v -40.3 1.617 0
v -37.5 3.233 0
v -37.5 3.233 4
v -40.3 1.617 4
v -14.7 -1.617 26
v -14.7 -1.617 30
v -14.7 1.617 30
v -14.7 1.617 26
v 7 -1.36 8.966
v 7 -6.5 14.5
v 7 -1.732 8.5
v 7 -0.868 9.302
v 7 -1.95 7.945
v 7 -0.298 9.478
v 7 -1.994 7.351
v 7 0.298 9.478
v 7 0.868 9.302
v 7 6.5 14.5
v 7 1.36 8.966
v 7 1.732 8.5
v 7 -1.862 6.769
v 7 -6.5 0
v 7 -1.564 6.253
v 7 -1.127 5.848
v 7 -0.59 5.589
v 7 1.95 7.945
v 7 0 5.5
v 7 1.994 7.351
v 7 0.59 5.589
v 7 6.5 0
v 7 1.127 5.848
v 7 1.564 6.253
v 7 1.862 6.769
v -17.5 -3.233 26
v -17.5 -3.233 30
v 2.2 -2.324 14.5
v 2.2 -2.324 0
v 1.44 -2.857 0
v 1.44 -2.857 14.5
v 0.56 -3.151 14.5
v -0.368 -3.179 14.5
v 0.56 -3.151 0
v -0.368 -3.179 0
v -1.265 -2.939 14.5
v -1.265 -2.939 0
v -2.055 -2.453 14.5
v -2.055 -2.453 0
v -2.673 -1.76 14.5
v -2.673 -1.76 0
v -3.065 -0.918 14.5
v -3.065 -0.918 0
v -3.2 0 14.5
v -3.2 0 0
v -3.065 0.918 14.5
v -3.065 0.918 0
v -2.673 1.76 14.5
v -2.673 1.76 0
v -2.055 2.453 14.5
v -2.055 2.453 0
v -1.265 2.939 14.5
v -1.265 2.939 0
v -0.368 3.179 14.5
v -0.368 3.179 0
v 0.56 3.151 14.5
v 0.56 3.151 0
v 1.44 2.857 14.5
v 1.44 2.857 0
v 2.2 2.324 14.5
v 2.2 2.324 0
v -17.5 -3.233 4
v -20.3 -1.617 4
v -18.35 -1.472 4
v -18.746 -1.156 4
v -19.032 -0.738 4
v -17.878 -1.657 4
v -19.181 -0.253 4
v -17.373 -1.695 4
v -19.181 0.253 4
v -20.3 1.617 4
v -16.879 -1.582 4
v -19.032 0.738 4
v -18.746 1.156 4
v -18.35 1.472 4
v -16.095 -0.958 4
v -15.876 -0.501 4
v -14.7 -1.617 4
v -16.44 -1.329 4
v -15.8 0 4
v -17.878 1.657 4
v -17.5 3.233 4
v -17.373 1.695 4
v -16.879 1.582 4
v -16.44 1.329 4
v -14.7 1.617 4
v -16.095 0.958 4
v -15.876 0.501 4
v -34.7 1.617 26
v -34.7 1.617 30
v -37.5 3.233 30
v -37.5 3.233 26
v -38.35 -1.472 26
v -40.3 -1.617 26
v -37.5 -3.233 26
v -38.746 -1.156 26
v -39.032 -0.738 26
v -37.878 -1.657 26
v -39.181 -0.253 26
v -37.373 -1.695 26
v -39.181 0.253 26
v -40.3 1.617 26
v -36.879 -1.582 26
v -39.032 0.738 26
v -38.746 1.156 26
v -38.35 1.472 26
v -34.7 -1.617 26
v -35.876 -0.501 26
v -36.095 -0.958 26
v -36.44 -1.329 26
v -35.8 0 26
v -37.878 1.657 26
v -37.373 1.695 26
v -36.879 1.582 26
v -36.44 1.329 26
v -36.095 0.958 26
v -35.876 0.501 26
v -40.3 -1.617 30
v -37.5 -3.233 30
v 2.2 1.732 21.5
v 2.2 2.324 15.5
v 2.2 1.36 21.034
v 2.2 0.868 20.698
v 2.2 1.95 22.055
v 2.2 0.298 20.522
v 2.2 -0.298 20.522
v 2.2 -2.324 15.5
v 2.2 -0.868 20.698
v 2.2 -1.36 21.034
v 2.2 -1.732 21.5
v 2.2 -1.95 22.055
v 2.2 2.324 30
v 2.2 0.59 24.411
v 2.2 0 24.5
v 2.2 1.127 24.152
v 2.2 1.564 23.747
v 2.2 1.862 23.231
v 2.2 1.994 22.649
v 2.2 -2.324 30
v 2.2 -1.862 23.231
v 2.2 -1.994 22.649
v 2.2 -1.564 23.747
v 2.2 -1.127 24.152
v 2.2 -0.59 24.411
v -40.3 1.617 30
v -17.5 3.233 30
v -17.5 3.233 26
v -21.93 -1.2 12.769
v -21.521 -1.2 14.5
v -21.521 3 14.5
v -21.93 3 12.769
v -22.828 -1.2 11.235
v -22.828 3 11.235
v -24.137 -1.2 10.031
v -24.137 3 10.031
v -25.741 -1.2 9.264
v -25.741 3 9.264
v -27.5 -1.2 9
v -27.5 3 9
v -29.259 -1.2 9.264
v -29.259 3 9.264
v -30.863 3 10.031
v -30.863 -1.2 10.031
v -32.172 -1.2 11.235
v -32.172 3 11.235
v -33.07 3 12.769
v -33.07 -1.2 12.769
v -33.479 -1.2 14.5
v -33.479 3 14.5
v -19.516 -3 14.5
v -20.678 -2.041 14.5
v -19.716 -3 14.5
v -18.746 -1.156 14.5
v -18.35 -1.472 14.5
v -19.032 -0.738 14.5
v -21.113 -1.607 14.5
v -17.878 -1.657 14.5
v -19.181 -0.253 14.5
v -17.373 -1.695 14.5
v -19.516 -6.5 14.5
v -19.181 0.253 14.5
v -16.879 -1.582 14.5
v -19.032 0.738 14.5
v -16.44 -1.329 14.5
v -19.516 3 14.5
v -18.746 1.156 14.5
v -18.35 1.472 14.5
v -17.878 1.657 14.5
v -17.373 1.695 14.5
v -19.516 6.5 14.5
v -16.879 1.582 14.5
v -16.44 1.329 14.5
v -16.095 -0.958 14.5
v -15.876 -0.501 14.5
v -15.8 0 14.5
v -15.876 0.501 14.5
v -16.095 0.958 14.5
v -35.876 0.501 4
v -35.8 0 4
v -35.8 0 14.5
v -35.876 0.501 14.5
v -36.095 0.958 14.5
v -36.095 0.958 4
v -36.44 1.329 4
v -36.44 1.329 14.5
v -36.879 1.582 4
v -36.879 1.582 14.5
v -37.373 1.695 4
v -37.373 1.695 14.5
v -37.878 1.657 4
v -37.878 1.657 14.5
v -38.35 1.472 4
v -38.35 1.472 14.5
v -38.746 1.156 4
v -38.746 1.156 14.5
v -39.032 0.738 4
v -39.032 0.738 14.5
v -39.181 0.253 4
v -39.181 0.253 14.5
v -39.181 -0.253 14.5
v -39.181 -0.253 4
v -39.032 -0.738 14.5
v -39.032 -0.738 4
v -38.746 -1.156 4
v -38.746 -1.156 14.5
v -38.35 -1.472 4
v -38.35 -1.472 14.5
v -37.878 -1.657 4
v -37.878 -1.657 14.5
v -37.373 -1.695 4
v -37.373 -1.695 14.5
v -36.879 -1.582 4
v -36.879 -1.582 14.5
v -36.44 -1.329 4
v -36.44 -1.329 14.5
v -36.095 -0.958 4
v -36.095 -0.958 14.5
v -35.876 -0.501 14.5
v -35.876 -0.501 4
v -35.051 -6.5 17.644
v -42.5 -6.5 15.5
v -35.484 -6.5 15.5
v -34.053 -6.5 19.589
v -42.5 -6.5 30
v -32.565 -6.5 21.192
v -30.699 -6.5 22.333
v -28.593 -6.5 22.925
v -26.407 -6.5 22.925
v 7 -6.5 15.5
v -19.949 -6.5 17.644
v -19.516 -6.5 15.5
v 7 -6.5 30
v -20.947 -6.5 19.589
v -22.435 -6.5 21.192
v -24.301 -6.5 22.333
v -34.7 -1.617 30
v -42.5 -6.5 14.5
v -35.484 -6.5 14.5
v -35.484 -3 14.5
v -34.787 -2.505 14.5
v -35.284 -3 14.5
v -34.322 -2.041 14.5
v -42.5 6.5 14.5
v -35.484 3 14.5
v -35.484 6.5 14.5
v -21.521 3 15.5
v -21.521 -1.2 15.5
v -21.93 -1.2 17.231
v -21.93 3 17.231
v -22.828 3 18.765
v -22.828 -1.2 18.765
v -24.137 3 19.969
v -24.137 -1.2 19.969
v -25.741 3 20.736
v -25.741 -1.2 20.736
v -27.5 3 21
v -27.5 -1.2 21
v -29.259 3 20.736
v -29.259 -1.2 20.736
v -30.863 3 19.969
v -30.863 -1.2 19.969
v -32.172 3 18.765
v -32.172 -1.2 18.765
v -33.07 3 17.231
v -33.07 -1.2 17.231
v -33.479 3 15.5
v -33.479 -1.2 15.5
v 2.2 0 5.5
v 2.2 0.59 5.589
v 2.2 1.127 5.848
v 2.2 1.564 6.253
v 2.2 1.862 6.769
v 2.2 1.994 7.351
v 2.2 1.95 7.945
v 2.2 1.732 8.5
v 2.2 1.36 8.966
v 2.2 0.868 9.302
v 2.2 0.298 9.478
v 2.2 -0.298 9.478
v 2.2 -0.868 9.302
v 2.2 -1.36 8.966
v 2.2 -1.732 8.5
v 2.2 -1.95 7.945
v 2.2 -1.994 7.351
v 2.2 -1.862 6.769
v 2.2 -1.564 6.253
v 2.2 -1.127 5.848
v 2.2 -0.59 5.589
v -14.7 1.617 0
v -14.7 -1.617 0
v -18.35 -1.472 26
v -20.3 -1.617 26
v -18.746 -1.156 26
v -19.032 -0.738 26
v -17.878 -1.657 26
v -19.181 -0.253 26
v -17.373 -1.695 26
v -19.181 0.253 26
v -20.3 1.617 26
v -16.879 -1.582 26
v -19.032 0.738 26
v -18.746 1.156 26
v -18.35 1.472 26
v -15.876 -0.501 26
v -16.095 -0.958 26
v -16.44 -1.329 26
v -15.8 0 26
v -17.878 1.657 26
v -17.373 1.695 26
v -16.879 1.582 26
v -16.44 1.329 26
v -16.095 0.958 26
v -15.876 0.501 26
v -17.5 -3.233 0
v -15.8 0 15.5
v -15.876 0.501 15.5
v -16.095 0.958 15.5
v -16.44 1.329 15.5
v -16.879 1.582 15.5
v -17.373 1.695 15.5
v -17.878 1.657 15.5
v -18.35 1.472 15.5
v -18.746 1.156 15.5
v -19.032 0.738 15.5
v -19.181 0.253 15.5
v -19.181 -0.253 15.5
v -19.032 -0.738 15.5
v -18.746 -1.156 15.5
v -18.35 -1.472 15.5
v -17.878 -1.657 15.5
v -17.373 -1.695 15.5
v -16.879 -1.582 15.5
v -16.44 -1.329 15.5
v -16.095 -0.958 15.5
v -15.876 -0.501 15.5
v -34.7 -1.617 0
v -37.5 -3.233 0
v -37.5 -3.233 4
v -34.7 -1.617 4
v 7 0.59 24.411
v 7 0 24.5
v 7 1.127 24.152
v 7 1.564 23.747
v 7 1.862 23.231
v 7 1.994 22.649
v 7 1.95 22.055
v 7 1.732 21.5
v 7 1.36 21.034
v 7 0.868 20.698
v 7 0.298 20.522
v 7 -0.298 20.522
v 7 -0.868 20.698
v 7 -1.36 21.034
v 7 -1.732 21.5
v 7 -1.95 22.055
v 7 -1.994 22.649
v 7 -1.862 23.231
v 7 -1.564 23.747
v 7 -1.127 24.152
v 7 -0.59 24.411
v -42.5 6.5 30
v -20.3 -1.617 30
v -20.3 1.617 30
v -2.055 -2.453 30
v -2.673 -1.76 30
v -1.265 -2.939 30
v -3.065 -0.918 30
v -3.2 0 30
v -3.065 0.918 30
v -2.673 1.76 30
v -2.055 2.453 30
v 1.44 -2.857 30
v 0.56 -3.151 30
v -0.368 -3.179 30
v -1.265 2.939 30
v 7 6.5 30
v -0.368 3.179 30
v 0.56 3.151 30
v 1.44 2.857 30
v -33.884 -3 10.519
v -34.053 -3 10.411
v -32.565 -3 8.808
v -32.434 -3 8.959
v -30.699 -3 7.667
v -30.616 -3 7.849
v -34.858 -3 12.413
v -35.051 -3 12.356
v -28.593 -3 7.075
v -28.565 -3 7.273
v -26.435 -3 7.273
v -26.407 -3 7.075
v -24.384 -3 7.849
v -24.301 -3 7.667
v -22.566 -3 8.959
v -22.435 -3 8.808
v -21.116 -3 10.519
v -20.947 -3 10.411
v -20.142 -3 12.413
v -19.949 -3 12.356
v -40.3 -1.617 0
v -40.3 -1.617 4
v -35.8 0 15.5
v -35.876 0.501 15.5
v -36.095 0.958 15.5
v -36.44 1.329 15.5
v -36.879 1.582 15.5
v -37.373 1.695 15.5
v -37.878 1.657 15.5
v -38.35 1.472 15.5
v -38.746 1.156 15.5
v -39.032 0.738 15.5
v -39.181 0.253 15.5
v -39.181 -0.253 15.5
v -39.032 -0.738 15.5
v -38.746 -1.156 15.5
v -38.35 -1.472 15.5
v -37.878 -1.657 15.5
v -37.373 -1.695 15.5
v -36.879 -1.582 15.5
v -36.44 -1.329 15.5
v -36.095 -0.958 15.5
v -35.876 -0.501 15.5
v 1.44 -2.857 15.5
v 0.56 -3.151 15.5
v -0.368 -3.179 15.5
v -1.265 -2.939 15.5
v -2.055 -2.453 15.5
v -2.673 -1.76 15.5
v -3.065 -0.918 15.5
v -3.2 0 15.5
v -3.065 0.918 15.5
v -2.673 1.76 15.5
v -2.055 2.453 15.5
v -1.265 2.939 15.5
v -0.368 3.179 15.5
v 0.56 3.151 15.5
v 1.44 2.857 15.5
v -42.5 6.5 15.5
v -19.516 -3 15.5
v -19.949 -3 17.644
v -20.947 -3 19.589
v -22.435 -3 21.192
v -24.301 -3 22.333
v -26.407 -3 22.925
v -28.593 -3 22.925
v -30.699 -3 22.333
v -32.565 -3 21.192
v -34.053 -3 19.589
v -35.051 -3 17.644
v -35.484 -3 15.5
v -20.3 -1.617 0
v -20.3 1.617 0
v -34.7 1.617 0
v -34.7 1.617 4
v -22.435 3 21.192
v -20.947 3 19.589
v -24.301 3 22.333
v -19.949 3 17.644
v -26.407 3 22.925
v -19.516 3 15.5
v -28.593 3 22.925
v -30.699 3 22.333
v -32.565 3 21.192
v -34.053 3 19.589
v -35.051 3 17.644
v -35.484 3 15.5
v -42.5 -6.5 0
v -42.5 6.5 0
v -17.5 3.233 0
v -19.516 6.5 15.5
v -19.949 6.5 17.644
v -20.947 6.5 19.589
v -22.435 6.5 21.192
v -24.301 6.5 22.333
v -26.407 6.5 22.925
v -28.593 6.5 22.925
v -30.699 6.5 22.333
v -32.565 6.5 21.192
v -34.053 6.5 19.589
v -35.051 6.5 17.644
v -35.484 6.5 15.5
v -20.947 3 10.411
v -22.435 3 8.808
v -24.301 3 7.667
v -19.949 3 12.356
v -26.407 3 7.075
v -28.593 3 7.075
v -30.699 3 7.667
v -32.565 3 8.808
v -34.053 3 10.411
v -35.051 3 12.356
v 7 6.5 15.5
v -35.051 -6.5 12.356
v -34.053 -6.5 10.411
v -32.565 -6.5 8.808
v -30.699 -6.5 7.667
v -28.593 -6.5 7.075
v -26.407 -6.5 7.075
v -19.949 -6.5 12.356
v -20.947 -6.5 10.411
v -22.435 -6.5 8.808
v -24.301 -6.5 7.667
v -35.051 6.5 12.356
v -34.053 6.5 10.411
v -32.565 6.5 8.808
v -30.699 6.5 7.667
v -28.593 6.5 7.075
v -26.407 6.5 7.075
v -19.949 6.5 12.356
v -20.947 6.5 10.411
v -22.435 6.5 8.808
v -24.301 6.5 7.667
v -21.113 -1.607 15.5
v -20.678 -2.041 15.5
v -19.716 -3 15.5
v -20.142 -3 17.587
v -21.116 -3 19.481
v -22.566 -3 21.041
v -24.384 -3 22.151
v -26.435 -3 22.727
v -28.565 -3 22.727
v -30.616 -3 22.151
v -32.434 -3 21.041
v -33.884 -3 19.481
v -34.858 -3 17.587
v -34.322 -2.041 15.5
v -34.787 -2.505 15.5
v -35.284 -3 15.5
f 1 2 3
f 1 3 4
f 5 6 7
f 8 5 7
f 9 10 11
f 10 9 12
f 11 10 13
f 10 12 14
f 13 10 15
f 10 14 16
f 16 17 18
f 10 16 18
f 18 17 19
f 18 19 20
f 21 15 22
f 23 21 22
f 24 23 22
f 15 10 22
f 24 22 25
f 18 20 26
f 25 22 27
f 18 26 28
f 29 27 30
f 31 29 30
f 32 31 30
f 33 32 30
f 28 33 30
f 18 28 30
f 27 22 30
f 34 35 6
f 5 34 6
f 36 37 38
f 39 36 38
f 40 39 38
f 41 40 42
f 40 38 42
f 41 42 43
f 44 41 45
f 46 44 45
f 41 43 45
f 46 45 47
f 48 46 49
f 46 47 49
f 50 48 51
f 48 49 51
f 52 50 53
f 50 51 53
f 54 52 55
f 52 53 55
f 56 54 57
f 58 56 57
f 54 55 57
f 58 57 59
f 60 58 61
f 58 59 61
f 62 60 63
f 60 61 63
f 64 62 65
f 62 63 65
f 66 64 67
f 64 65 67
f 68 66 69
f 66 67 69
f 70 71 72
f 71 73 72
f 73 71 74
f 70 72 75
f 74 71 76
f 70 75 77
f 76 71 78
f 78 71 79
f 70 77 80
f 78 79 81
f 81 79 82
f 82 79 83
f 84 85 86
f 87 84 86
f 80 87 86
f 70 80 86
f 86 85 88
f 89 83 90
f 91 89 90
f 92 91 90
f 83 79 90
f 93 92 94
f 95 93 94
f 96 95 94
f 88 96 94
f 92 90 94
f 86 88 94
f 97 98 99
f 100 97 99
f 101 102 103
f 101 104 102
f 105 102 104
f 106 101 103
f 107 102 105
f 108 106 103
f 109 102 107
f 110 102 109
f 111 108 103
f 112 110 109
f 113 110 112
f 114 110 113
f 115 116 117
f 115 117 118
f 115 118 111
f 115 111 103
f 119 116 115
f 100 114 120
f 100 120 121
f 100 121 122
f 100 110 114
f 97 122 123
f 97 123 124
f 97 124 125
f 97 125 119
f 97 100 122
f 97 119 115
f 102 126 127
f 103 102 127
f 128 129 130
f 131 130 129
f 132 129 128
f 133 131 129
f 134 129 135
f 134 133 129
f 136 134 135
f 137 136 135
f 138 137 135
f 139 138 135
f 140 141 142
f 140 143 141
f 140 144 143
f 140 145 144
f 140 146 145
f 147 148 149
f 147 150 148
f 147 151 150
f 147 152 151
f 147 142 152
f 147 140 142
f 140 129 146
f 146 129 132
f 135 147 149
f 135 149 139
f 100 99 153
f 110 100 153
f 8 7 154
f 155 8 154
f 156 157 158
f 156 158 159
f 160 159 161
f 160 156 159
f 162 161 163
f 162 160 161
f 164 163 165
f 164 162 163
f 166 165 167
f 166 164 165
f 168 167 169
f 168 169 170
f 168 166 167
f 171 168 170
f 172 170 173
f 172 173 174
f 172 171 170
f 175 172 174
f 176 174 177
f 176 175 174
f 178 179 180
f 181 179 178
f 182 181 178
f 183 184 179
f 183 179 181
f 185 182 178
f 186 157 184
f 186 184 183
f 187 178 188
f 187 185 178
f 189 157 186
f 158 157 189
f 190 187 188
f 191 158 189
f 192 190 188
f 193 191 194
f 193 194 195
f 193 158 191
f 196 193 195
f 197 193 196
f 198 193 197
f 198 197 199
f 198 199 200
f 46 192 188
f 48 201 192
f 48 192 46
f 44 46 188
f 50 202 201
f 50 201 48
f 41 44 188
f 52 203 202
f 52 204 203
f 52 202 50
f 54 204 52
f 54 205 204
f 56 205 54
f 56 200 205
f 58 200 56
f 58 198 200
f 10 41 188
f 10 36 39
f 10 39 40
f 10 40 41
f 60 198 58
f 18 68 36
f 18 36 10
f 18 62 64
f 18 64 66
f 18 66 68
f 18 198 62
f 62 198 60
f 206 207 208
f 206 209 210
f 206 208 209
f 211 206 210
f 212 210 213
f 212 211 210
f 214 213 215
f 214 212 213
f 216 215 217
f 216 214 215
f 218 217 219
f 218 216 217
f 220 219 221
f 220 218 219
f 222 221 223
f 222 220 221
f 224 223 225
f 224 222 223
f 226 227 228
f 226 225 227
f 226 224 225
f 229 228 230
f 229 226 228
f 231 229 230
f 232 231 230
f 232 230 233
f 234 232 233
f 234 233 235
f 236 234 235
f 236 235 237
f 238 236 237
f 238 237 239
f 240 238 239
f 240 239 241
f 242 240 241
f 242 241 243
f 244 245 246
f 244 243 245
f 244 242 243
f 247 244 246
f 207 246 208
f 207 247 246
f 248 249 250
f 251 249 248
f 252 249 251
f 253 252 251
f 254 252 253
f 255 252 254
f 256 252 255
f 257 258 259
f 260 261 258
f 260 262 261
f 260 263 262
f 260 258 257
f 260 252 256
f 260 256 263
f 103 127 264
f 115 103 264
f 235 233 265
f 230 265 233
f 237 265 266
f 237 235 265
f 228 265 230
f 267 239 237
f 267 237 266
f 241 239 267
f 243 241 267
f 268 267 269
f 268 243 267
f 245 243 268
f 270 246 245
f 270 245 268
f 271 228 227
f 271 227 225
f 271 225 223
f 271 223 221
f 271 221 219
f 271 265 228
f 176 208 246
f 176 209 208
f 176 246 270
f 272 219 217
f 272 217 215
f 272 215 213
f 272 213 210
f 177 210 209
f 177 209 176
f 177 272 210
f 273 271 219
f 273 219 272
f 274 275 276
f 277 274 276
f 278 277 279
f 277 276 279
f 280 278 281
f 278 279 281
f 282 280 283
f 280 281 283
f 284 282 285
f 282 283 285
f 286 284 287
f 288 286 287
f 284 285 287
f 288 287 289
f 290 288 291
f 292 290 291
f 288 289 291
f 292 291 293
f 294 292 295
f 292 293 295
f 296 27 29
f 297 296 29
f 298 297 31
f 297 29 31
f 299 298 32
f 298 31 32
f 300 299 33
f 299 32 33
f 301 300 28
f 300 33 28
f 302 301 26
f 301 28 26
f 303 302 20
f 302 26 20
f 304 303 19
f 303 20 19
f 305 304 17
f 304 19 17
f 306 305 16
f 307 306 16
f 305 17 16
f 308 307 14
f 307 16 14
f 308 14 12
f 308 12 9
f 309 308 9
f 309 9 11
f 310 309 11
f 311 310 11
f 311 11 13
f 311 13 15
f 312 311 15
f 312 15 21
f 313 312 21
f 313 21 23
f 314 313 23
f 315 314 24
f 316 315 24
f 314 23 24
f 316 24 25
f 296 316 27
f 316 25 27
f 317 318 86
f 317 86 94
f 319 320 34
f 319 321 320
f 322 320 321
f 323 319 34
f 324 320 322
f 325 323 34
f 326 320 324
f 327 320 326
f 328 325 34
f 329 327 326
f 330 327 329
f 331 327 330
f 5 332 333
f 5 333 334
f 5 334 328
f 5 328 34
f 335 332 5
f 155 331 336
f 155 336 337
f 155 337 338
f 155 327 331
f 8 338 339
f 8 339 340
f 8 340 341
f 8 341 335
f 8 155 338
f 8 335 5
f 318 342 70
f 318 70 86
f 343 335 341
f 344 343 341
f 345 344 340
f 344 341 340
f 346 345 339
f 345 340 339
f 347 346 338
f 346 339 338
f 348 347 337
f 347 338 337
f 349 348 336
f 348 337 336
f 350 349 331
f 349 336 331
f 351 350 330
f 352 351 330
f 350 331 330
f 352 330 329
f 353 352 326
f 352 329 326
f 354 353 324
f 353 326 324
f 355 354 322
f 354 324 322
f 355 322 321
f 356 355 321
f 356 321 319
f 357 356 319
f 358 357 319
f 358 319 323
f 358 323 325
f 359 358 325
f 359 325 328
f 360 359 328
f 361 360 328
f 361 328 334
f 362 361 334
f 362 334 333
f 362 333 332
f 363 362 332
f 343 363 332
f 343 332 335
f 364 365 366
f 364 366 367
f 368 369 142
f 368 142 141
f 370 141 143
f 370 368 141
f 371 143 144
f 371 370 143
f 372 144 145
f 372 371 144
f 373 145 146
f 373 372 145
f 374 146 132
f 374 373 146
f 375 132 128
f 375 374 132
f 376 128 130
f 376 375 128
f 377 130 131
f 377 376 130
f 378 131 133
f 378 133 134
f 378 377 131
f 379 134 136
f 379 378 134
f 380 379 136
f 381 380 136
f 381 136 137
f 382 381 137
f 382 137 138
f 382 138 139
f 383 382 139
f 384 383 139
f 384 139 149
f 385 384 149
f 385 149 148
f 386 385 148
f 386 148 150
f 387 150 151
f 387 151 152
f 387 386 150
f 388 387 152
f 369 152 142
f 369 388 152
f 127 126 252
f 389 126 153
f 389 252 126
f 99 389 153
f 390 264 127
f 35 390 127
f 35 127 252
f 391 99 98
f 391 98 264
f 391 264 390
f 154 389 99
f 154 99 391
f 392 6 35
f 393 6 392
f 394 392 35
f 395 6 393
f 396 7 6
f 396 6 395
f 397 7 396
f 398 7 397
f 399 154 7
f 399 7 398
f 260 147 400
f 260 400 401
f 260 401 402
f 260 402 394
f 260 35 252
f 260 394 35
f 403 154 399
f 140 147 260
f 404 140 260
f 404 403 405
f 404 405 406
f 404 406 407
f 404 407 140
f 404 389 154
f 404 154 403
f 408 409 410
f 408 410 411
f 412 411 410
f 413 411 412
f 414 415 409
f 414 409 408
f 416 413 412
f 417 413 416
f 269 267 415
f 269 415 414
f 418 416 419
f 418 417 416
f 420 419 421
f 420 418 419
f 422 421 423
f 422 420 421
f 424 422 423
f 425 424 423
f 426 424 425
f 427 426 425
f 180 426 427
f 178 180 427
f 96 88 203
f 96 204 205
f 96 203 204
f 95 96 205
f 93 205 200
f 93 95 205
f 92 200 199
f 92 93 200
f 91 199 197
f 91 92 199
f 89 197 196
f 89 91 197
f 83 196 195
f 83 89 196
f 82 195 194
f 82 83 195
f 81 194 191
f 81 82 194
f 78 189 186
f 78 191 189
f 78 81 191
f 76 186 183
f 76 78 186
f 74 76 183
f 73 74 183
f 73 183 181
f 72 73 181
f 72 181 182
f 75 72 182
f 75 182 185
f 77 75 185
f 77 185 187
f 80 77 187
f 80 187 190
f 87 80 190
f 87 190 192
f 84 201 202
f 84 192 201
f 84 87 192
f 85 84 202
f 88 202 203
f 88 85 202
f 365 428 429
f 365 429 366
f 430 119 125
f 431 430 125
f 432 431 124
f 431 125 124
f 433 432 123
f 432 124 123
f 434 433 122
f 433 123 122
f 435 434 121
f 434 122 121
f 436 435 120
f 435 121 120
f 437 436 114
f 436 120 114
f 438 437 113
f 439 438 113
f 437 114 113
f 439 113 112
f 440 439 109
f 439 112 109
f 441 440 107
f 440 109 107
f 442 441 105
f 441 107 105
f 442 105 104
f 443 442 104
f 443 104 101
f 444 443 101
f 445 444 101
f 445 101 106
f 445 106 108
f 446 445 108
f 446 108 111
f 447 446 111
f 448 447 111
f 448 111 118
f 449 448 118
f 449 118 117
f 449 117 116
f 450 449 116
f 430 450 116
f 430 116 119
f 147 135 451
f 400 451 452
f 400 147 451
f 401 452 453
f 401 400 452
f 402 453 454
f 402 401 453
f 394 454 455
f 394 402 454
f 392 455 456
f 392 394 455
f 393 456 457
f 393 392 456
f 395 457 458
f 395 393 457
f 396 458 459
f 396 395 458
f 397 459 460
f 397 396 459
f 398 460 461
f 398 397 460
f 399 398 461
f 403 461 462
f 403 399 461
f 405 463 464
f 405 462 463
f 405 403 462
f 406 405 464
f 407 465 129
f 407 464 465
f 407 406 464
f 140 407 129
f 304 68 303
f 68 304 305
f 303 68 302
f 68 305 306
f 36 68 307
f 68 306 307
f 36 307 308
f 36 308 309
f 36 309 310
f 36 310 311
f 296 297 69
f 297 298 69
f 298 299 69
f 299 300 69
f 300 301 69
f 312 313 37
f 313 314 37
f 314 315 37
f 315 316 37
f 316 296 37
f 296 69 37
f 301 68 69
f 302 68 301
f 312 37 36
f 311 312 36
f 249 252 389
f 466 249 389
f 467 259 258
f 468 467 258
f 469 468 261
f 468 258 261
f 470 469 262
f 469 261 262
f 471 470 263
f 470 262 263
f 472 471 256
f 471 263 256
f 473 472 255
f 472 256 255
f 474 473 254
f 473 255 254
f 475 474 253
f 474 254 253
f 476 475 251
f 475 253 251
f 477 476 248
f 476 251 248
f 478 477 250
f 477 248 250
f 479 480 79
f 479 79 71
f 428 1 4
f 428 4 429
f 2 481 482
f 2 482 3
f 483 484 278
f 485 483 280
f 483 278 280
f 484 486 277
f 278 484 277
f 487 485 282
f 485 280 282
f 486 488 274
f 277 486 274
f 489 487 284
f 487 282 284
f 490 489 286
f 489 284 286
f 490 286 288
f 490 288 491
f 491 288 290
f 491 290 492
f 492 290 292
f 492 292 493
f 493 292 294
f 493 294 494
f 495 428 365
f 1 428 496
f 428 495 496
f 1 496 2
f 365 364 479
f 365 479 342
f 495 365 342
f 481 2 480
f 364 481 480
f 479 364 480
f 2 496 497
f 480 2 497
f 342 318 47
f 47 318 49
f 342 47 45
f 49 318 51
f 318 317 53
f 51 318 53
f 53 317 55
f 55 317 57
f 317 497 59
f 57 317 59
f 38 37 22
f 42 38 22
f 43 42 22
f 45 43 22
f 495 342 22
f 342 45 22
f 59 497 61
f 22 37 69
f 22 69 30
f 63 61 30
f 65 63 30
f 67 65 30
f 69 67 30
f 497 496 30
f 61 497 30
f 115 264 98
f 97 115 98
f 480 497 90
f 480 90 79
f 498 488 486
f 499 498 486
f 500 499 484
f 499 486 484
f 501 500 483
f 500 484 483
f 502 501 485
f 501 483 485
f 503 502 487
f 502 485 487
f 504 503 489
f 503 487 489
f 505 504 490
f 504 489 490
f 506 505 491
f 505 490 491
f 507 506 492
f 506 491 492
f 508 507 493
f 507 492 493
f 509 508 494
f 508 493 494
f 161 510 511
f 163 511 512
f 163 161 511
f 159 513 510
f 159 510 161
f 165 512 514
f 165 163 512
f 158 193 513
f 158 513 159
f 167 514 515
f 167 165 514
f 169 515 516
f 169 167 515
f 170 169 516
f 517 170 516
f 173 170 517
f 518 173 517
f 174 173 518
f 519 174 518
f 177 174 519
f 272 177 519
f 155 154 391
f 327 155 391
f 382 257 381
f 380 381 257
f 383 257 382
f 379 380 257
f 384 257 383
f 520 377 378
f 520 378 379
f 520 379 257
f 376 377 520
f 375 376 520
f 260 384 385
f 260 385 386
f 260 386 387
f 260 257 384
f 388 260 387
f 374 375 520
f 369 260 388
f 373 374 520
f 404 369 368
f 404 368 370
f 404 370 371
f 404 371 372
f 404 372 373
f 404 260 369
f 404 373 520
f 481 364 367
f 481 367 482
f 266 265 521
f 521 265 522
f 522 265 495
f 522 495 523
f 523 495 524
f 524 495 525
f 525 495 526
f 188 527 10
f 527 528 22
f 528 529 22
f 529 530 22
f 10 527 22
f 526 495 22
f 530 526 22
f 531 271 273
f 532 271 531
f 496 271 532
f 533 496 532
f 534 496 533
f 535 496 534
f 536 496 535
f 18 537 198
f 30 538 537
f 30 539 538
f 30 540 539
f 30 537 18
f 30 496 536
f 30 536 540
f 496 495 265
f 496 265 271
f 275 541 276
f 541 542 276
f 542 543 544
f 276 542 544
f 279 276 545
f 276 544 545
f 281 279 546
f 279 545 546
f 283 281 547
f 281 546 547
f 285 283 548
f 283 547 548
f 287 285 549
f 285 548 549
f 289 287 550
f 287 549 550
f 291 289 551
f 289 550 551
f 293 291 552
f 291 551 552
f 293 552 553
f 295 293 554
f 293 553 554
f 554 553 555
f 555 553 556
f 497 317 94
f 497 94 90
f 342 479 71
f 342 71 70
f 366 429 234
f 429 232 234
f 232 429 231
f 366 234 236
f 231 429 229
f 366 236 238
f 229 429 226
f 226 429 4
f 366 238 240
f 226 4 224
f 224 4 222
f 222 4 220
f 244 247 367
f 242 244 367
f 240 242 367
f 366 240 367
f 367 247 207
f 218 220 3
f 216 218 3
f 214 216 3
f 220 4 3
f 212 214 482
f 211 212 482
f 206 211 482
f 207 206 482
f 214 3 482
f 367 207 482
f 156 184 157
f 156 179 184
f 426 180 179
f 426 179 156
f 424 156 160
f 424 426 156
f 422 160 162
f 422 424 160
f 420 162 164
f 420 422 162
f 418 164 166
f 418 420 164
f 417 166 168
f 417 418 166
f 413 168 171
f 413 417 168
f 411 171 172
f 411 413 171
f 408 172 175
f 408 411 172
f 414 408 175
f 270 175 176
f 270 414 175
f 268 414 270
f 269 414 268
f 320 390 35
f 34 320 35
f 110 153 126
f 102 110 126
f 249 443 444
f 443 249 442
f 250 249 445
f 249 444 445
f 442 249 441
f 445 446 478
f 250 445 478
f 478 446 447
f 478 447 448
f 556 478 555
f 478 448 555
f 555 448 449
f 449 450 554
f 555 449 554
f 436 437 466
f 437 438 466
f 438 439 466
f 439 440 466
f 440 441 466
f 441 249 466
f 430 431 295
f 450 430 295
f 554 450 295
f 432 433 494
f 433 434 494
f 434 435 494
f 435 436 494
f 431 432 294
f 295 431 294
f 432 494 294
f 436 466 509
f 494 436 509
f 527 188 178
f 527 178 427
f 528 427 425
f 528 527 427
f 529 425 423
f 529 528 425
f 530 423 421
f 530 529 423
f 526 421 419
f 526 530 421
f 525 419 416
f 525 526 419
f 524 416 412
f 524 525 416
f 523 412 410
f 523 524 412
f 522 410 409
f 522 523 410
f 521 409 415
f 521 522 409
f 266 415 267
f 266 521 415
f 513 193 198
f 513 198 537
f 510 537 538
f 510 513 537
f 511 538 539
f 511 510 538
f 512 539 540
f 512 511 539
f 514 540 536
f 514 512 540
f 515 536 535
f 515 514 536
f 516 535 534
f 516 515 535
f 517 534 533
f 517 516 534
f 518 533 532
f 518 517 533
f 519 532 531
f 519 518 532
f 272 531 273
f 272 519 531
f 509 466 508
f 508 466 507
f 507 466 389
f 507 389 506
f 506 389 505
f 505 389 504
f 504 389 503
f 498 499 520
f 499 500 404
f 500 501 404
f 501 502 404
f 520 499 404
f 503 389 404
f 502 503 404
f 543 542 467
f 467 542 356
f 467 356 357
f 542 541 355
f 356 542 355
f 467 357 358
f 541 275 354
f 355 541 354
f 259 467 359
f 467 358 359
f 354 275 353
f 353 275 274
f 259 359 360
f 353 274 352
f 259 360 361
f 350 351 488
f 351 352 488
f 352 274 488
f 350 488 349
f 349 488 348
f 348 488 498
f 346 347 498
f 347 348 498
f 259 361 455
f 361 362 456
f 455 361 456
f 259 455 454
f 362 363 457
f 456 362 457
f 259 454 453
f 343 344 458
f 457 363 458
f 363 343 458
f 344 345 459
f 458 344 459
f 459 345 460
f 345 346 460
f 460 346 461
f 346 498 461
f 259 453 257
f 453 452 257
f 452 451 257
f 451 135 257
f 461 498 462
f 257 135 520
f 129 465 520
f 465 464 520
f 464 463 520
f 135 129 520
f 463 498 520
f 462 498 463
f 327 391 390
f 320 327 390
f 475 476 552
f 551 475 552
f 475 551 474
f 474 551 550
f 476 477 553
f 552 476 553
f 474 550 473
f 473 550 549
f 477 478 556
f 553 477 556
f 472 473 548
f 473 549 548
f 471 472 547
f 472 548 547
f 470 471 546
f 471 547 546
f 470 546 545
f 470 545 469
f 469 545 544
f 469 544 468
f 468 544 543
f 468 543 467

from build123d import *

# Parameters (mm, degrees)
SKIZZE1_W                            = 49.5
SKIZZE1_H                            = 13
SKIZZE1_R                            = 1.7
AUFSATZ_LINEAR_AUSTRAGEN1_DEPTH      = 15
FASE1_SIZE                           = 1.8
SCHNITT_LINEAR_AUSTRAGEN1_DEPTH      = 4
SKIZZE4_R                            = 2
SCHNITT_LINEAR_AUSTRAGEN2_DEPTH      = 4.8
SKIZZE5_W                            = 56.14798386
SKIZZE5_H                            = 1
SCHNITT_LINEAR_AUSTRAGEN3_DEPTH      = 7.5
SCHNITT_LINEAR_AUSTRAGEN3_DEPTH_BACK = 7.5


with BuildPart() as part:
    # Skizze1 → Aufsatz-Linear austragen1 (new body)
    with BuildSketch(Plane.XY):
        with Locations((-17.75, 0)):
            Rectangle(SKIZZE1_W, SKIZZE1_H)
        with Locations((-17.5, 0)):
            Circle(SKIZZE1_R, mode=Mode.SUBTRACT)
        with Locations((-37.5, 0)):
            Circle(SKIZZE1_R, mode=Mode.SUBTRACT)
        with BuildLine():
            Line((2.2, 2.323790008), (2.2, -2.323790008))
            ThreePointArc((2.2, -2.323790008), (-3.2, 0), (2.2, 2.323790008))
        make_face(mode=Mode.SUBTRACT)
    extrude(amount=AUFSATZ_LINEAR_AUSTRAGEN1_DEPTH)

    # Skizze2 → Schnitt-Rotation1 (revolve, cut)
    with BuildSketch(Plane.XY.offset(15)):
        Polygon((-35.5, 6.5), (-35.5, 3), (-33.5, 3), (-33.5, -3), (-35.5, -3), (-35.5, -6.5), (-27.5, -6.5), (-27.5, 6.5), align=None)
    revolve(axis=Axis((-27.5, -6.5, 15), (0, 1, 0)), mode=Mode.SUBTRACT)

    # Fase1
    fase1_edges = [part.edges().sort_by_distance(p)[0] for p in [
        (-27.5, -3, 9),
    ]]
    chamfer(fase1_edges, length=FASE1_SIZE)

    # Skizze3 → Schnitt-Linear austragen1 (cut)
    with BuildSketch(Plane.XY):
        Polygon((-14.7, -1.616580754), (-14.7, 1.616580754), (-17.5, 3.233161507), (-20.3, 1.616580754), (-20.3, -1.616580754), (-17.5, -3.233161507), align=None)
        Polygon((-37.5, -3.233161507), (-34.7, -1.616580754), (-34.7, 1.616580754), (-37.5, 3.233161507), (-40.3, 1.616580754), (-40.3, -1.616580754), align=None)
    extrude(amount=SCHNITT_LINEAR_AUSTRAGEN1_DEPTH, mode=Mode.SUBTRACT)

    # Skizze4 → Schnitt-Linear austragen2 (cut)
    with BuildSketch(Plane(origin=(7, 0, 0), x_dir=(0, 0, -1), z_dir=(1, 0, 0))):
        with Locations((-7.5, 0)):
            Circle(SKIZZE4_R)
    extrude(amount=-SCHNITT_LINEAR_AUSTRAGEN2_DEPTH, mode=Mode.SUBTRACT)


with BuildPart() as body_2:
    # Spiegeln1: mirrored copy
    add(part.part.mirror(Plane.XY.offset(15)))


with BuildPart() as schnitt_linear_austragen3_tool:
    # Skizze5 → Schnitt-Linear austragen3 (new body, two sides)
    with BuildSketch(Plane(origin=(0, 0, 0), x_dir=(1, 0, 0), z_dir=(0, 1, 0))) as schnitt_linear_austragen3_sk:
        with Locations((-20.374969748, -15)):
            Rectangle(SKIZZE5_W, SKIZZE5_H)
    extrude(amount=SCHNITT_LINEAR_AUSTRAGEN3_DEPTH)
    extrude(schnitt_linear_austragen3_sk.sketch, amount=-SCHNITT_LINEAR_AUSTRAGEN3_DEPTH_BACK)


with BuildPart() as part_1:
    add(part.part)

    # Schnitt-Linear austragen3: cut by schnitt_linear_austragen3_tool
    add(schnitt_linear_austragen3_tool.part, mode=Mode.SUBTRACT)


with BuildPart() as body_2_1:
    add(body_2.part)

    # Schnitt-Linear austragen3: cut by schnitt_linear_austragen3_tool
    add(schnitt_linear_austragen3_tool.part, mode=Mode.SUBTRACT)


solid = Compound([part_1.part, body_2_1.part])
